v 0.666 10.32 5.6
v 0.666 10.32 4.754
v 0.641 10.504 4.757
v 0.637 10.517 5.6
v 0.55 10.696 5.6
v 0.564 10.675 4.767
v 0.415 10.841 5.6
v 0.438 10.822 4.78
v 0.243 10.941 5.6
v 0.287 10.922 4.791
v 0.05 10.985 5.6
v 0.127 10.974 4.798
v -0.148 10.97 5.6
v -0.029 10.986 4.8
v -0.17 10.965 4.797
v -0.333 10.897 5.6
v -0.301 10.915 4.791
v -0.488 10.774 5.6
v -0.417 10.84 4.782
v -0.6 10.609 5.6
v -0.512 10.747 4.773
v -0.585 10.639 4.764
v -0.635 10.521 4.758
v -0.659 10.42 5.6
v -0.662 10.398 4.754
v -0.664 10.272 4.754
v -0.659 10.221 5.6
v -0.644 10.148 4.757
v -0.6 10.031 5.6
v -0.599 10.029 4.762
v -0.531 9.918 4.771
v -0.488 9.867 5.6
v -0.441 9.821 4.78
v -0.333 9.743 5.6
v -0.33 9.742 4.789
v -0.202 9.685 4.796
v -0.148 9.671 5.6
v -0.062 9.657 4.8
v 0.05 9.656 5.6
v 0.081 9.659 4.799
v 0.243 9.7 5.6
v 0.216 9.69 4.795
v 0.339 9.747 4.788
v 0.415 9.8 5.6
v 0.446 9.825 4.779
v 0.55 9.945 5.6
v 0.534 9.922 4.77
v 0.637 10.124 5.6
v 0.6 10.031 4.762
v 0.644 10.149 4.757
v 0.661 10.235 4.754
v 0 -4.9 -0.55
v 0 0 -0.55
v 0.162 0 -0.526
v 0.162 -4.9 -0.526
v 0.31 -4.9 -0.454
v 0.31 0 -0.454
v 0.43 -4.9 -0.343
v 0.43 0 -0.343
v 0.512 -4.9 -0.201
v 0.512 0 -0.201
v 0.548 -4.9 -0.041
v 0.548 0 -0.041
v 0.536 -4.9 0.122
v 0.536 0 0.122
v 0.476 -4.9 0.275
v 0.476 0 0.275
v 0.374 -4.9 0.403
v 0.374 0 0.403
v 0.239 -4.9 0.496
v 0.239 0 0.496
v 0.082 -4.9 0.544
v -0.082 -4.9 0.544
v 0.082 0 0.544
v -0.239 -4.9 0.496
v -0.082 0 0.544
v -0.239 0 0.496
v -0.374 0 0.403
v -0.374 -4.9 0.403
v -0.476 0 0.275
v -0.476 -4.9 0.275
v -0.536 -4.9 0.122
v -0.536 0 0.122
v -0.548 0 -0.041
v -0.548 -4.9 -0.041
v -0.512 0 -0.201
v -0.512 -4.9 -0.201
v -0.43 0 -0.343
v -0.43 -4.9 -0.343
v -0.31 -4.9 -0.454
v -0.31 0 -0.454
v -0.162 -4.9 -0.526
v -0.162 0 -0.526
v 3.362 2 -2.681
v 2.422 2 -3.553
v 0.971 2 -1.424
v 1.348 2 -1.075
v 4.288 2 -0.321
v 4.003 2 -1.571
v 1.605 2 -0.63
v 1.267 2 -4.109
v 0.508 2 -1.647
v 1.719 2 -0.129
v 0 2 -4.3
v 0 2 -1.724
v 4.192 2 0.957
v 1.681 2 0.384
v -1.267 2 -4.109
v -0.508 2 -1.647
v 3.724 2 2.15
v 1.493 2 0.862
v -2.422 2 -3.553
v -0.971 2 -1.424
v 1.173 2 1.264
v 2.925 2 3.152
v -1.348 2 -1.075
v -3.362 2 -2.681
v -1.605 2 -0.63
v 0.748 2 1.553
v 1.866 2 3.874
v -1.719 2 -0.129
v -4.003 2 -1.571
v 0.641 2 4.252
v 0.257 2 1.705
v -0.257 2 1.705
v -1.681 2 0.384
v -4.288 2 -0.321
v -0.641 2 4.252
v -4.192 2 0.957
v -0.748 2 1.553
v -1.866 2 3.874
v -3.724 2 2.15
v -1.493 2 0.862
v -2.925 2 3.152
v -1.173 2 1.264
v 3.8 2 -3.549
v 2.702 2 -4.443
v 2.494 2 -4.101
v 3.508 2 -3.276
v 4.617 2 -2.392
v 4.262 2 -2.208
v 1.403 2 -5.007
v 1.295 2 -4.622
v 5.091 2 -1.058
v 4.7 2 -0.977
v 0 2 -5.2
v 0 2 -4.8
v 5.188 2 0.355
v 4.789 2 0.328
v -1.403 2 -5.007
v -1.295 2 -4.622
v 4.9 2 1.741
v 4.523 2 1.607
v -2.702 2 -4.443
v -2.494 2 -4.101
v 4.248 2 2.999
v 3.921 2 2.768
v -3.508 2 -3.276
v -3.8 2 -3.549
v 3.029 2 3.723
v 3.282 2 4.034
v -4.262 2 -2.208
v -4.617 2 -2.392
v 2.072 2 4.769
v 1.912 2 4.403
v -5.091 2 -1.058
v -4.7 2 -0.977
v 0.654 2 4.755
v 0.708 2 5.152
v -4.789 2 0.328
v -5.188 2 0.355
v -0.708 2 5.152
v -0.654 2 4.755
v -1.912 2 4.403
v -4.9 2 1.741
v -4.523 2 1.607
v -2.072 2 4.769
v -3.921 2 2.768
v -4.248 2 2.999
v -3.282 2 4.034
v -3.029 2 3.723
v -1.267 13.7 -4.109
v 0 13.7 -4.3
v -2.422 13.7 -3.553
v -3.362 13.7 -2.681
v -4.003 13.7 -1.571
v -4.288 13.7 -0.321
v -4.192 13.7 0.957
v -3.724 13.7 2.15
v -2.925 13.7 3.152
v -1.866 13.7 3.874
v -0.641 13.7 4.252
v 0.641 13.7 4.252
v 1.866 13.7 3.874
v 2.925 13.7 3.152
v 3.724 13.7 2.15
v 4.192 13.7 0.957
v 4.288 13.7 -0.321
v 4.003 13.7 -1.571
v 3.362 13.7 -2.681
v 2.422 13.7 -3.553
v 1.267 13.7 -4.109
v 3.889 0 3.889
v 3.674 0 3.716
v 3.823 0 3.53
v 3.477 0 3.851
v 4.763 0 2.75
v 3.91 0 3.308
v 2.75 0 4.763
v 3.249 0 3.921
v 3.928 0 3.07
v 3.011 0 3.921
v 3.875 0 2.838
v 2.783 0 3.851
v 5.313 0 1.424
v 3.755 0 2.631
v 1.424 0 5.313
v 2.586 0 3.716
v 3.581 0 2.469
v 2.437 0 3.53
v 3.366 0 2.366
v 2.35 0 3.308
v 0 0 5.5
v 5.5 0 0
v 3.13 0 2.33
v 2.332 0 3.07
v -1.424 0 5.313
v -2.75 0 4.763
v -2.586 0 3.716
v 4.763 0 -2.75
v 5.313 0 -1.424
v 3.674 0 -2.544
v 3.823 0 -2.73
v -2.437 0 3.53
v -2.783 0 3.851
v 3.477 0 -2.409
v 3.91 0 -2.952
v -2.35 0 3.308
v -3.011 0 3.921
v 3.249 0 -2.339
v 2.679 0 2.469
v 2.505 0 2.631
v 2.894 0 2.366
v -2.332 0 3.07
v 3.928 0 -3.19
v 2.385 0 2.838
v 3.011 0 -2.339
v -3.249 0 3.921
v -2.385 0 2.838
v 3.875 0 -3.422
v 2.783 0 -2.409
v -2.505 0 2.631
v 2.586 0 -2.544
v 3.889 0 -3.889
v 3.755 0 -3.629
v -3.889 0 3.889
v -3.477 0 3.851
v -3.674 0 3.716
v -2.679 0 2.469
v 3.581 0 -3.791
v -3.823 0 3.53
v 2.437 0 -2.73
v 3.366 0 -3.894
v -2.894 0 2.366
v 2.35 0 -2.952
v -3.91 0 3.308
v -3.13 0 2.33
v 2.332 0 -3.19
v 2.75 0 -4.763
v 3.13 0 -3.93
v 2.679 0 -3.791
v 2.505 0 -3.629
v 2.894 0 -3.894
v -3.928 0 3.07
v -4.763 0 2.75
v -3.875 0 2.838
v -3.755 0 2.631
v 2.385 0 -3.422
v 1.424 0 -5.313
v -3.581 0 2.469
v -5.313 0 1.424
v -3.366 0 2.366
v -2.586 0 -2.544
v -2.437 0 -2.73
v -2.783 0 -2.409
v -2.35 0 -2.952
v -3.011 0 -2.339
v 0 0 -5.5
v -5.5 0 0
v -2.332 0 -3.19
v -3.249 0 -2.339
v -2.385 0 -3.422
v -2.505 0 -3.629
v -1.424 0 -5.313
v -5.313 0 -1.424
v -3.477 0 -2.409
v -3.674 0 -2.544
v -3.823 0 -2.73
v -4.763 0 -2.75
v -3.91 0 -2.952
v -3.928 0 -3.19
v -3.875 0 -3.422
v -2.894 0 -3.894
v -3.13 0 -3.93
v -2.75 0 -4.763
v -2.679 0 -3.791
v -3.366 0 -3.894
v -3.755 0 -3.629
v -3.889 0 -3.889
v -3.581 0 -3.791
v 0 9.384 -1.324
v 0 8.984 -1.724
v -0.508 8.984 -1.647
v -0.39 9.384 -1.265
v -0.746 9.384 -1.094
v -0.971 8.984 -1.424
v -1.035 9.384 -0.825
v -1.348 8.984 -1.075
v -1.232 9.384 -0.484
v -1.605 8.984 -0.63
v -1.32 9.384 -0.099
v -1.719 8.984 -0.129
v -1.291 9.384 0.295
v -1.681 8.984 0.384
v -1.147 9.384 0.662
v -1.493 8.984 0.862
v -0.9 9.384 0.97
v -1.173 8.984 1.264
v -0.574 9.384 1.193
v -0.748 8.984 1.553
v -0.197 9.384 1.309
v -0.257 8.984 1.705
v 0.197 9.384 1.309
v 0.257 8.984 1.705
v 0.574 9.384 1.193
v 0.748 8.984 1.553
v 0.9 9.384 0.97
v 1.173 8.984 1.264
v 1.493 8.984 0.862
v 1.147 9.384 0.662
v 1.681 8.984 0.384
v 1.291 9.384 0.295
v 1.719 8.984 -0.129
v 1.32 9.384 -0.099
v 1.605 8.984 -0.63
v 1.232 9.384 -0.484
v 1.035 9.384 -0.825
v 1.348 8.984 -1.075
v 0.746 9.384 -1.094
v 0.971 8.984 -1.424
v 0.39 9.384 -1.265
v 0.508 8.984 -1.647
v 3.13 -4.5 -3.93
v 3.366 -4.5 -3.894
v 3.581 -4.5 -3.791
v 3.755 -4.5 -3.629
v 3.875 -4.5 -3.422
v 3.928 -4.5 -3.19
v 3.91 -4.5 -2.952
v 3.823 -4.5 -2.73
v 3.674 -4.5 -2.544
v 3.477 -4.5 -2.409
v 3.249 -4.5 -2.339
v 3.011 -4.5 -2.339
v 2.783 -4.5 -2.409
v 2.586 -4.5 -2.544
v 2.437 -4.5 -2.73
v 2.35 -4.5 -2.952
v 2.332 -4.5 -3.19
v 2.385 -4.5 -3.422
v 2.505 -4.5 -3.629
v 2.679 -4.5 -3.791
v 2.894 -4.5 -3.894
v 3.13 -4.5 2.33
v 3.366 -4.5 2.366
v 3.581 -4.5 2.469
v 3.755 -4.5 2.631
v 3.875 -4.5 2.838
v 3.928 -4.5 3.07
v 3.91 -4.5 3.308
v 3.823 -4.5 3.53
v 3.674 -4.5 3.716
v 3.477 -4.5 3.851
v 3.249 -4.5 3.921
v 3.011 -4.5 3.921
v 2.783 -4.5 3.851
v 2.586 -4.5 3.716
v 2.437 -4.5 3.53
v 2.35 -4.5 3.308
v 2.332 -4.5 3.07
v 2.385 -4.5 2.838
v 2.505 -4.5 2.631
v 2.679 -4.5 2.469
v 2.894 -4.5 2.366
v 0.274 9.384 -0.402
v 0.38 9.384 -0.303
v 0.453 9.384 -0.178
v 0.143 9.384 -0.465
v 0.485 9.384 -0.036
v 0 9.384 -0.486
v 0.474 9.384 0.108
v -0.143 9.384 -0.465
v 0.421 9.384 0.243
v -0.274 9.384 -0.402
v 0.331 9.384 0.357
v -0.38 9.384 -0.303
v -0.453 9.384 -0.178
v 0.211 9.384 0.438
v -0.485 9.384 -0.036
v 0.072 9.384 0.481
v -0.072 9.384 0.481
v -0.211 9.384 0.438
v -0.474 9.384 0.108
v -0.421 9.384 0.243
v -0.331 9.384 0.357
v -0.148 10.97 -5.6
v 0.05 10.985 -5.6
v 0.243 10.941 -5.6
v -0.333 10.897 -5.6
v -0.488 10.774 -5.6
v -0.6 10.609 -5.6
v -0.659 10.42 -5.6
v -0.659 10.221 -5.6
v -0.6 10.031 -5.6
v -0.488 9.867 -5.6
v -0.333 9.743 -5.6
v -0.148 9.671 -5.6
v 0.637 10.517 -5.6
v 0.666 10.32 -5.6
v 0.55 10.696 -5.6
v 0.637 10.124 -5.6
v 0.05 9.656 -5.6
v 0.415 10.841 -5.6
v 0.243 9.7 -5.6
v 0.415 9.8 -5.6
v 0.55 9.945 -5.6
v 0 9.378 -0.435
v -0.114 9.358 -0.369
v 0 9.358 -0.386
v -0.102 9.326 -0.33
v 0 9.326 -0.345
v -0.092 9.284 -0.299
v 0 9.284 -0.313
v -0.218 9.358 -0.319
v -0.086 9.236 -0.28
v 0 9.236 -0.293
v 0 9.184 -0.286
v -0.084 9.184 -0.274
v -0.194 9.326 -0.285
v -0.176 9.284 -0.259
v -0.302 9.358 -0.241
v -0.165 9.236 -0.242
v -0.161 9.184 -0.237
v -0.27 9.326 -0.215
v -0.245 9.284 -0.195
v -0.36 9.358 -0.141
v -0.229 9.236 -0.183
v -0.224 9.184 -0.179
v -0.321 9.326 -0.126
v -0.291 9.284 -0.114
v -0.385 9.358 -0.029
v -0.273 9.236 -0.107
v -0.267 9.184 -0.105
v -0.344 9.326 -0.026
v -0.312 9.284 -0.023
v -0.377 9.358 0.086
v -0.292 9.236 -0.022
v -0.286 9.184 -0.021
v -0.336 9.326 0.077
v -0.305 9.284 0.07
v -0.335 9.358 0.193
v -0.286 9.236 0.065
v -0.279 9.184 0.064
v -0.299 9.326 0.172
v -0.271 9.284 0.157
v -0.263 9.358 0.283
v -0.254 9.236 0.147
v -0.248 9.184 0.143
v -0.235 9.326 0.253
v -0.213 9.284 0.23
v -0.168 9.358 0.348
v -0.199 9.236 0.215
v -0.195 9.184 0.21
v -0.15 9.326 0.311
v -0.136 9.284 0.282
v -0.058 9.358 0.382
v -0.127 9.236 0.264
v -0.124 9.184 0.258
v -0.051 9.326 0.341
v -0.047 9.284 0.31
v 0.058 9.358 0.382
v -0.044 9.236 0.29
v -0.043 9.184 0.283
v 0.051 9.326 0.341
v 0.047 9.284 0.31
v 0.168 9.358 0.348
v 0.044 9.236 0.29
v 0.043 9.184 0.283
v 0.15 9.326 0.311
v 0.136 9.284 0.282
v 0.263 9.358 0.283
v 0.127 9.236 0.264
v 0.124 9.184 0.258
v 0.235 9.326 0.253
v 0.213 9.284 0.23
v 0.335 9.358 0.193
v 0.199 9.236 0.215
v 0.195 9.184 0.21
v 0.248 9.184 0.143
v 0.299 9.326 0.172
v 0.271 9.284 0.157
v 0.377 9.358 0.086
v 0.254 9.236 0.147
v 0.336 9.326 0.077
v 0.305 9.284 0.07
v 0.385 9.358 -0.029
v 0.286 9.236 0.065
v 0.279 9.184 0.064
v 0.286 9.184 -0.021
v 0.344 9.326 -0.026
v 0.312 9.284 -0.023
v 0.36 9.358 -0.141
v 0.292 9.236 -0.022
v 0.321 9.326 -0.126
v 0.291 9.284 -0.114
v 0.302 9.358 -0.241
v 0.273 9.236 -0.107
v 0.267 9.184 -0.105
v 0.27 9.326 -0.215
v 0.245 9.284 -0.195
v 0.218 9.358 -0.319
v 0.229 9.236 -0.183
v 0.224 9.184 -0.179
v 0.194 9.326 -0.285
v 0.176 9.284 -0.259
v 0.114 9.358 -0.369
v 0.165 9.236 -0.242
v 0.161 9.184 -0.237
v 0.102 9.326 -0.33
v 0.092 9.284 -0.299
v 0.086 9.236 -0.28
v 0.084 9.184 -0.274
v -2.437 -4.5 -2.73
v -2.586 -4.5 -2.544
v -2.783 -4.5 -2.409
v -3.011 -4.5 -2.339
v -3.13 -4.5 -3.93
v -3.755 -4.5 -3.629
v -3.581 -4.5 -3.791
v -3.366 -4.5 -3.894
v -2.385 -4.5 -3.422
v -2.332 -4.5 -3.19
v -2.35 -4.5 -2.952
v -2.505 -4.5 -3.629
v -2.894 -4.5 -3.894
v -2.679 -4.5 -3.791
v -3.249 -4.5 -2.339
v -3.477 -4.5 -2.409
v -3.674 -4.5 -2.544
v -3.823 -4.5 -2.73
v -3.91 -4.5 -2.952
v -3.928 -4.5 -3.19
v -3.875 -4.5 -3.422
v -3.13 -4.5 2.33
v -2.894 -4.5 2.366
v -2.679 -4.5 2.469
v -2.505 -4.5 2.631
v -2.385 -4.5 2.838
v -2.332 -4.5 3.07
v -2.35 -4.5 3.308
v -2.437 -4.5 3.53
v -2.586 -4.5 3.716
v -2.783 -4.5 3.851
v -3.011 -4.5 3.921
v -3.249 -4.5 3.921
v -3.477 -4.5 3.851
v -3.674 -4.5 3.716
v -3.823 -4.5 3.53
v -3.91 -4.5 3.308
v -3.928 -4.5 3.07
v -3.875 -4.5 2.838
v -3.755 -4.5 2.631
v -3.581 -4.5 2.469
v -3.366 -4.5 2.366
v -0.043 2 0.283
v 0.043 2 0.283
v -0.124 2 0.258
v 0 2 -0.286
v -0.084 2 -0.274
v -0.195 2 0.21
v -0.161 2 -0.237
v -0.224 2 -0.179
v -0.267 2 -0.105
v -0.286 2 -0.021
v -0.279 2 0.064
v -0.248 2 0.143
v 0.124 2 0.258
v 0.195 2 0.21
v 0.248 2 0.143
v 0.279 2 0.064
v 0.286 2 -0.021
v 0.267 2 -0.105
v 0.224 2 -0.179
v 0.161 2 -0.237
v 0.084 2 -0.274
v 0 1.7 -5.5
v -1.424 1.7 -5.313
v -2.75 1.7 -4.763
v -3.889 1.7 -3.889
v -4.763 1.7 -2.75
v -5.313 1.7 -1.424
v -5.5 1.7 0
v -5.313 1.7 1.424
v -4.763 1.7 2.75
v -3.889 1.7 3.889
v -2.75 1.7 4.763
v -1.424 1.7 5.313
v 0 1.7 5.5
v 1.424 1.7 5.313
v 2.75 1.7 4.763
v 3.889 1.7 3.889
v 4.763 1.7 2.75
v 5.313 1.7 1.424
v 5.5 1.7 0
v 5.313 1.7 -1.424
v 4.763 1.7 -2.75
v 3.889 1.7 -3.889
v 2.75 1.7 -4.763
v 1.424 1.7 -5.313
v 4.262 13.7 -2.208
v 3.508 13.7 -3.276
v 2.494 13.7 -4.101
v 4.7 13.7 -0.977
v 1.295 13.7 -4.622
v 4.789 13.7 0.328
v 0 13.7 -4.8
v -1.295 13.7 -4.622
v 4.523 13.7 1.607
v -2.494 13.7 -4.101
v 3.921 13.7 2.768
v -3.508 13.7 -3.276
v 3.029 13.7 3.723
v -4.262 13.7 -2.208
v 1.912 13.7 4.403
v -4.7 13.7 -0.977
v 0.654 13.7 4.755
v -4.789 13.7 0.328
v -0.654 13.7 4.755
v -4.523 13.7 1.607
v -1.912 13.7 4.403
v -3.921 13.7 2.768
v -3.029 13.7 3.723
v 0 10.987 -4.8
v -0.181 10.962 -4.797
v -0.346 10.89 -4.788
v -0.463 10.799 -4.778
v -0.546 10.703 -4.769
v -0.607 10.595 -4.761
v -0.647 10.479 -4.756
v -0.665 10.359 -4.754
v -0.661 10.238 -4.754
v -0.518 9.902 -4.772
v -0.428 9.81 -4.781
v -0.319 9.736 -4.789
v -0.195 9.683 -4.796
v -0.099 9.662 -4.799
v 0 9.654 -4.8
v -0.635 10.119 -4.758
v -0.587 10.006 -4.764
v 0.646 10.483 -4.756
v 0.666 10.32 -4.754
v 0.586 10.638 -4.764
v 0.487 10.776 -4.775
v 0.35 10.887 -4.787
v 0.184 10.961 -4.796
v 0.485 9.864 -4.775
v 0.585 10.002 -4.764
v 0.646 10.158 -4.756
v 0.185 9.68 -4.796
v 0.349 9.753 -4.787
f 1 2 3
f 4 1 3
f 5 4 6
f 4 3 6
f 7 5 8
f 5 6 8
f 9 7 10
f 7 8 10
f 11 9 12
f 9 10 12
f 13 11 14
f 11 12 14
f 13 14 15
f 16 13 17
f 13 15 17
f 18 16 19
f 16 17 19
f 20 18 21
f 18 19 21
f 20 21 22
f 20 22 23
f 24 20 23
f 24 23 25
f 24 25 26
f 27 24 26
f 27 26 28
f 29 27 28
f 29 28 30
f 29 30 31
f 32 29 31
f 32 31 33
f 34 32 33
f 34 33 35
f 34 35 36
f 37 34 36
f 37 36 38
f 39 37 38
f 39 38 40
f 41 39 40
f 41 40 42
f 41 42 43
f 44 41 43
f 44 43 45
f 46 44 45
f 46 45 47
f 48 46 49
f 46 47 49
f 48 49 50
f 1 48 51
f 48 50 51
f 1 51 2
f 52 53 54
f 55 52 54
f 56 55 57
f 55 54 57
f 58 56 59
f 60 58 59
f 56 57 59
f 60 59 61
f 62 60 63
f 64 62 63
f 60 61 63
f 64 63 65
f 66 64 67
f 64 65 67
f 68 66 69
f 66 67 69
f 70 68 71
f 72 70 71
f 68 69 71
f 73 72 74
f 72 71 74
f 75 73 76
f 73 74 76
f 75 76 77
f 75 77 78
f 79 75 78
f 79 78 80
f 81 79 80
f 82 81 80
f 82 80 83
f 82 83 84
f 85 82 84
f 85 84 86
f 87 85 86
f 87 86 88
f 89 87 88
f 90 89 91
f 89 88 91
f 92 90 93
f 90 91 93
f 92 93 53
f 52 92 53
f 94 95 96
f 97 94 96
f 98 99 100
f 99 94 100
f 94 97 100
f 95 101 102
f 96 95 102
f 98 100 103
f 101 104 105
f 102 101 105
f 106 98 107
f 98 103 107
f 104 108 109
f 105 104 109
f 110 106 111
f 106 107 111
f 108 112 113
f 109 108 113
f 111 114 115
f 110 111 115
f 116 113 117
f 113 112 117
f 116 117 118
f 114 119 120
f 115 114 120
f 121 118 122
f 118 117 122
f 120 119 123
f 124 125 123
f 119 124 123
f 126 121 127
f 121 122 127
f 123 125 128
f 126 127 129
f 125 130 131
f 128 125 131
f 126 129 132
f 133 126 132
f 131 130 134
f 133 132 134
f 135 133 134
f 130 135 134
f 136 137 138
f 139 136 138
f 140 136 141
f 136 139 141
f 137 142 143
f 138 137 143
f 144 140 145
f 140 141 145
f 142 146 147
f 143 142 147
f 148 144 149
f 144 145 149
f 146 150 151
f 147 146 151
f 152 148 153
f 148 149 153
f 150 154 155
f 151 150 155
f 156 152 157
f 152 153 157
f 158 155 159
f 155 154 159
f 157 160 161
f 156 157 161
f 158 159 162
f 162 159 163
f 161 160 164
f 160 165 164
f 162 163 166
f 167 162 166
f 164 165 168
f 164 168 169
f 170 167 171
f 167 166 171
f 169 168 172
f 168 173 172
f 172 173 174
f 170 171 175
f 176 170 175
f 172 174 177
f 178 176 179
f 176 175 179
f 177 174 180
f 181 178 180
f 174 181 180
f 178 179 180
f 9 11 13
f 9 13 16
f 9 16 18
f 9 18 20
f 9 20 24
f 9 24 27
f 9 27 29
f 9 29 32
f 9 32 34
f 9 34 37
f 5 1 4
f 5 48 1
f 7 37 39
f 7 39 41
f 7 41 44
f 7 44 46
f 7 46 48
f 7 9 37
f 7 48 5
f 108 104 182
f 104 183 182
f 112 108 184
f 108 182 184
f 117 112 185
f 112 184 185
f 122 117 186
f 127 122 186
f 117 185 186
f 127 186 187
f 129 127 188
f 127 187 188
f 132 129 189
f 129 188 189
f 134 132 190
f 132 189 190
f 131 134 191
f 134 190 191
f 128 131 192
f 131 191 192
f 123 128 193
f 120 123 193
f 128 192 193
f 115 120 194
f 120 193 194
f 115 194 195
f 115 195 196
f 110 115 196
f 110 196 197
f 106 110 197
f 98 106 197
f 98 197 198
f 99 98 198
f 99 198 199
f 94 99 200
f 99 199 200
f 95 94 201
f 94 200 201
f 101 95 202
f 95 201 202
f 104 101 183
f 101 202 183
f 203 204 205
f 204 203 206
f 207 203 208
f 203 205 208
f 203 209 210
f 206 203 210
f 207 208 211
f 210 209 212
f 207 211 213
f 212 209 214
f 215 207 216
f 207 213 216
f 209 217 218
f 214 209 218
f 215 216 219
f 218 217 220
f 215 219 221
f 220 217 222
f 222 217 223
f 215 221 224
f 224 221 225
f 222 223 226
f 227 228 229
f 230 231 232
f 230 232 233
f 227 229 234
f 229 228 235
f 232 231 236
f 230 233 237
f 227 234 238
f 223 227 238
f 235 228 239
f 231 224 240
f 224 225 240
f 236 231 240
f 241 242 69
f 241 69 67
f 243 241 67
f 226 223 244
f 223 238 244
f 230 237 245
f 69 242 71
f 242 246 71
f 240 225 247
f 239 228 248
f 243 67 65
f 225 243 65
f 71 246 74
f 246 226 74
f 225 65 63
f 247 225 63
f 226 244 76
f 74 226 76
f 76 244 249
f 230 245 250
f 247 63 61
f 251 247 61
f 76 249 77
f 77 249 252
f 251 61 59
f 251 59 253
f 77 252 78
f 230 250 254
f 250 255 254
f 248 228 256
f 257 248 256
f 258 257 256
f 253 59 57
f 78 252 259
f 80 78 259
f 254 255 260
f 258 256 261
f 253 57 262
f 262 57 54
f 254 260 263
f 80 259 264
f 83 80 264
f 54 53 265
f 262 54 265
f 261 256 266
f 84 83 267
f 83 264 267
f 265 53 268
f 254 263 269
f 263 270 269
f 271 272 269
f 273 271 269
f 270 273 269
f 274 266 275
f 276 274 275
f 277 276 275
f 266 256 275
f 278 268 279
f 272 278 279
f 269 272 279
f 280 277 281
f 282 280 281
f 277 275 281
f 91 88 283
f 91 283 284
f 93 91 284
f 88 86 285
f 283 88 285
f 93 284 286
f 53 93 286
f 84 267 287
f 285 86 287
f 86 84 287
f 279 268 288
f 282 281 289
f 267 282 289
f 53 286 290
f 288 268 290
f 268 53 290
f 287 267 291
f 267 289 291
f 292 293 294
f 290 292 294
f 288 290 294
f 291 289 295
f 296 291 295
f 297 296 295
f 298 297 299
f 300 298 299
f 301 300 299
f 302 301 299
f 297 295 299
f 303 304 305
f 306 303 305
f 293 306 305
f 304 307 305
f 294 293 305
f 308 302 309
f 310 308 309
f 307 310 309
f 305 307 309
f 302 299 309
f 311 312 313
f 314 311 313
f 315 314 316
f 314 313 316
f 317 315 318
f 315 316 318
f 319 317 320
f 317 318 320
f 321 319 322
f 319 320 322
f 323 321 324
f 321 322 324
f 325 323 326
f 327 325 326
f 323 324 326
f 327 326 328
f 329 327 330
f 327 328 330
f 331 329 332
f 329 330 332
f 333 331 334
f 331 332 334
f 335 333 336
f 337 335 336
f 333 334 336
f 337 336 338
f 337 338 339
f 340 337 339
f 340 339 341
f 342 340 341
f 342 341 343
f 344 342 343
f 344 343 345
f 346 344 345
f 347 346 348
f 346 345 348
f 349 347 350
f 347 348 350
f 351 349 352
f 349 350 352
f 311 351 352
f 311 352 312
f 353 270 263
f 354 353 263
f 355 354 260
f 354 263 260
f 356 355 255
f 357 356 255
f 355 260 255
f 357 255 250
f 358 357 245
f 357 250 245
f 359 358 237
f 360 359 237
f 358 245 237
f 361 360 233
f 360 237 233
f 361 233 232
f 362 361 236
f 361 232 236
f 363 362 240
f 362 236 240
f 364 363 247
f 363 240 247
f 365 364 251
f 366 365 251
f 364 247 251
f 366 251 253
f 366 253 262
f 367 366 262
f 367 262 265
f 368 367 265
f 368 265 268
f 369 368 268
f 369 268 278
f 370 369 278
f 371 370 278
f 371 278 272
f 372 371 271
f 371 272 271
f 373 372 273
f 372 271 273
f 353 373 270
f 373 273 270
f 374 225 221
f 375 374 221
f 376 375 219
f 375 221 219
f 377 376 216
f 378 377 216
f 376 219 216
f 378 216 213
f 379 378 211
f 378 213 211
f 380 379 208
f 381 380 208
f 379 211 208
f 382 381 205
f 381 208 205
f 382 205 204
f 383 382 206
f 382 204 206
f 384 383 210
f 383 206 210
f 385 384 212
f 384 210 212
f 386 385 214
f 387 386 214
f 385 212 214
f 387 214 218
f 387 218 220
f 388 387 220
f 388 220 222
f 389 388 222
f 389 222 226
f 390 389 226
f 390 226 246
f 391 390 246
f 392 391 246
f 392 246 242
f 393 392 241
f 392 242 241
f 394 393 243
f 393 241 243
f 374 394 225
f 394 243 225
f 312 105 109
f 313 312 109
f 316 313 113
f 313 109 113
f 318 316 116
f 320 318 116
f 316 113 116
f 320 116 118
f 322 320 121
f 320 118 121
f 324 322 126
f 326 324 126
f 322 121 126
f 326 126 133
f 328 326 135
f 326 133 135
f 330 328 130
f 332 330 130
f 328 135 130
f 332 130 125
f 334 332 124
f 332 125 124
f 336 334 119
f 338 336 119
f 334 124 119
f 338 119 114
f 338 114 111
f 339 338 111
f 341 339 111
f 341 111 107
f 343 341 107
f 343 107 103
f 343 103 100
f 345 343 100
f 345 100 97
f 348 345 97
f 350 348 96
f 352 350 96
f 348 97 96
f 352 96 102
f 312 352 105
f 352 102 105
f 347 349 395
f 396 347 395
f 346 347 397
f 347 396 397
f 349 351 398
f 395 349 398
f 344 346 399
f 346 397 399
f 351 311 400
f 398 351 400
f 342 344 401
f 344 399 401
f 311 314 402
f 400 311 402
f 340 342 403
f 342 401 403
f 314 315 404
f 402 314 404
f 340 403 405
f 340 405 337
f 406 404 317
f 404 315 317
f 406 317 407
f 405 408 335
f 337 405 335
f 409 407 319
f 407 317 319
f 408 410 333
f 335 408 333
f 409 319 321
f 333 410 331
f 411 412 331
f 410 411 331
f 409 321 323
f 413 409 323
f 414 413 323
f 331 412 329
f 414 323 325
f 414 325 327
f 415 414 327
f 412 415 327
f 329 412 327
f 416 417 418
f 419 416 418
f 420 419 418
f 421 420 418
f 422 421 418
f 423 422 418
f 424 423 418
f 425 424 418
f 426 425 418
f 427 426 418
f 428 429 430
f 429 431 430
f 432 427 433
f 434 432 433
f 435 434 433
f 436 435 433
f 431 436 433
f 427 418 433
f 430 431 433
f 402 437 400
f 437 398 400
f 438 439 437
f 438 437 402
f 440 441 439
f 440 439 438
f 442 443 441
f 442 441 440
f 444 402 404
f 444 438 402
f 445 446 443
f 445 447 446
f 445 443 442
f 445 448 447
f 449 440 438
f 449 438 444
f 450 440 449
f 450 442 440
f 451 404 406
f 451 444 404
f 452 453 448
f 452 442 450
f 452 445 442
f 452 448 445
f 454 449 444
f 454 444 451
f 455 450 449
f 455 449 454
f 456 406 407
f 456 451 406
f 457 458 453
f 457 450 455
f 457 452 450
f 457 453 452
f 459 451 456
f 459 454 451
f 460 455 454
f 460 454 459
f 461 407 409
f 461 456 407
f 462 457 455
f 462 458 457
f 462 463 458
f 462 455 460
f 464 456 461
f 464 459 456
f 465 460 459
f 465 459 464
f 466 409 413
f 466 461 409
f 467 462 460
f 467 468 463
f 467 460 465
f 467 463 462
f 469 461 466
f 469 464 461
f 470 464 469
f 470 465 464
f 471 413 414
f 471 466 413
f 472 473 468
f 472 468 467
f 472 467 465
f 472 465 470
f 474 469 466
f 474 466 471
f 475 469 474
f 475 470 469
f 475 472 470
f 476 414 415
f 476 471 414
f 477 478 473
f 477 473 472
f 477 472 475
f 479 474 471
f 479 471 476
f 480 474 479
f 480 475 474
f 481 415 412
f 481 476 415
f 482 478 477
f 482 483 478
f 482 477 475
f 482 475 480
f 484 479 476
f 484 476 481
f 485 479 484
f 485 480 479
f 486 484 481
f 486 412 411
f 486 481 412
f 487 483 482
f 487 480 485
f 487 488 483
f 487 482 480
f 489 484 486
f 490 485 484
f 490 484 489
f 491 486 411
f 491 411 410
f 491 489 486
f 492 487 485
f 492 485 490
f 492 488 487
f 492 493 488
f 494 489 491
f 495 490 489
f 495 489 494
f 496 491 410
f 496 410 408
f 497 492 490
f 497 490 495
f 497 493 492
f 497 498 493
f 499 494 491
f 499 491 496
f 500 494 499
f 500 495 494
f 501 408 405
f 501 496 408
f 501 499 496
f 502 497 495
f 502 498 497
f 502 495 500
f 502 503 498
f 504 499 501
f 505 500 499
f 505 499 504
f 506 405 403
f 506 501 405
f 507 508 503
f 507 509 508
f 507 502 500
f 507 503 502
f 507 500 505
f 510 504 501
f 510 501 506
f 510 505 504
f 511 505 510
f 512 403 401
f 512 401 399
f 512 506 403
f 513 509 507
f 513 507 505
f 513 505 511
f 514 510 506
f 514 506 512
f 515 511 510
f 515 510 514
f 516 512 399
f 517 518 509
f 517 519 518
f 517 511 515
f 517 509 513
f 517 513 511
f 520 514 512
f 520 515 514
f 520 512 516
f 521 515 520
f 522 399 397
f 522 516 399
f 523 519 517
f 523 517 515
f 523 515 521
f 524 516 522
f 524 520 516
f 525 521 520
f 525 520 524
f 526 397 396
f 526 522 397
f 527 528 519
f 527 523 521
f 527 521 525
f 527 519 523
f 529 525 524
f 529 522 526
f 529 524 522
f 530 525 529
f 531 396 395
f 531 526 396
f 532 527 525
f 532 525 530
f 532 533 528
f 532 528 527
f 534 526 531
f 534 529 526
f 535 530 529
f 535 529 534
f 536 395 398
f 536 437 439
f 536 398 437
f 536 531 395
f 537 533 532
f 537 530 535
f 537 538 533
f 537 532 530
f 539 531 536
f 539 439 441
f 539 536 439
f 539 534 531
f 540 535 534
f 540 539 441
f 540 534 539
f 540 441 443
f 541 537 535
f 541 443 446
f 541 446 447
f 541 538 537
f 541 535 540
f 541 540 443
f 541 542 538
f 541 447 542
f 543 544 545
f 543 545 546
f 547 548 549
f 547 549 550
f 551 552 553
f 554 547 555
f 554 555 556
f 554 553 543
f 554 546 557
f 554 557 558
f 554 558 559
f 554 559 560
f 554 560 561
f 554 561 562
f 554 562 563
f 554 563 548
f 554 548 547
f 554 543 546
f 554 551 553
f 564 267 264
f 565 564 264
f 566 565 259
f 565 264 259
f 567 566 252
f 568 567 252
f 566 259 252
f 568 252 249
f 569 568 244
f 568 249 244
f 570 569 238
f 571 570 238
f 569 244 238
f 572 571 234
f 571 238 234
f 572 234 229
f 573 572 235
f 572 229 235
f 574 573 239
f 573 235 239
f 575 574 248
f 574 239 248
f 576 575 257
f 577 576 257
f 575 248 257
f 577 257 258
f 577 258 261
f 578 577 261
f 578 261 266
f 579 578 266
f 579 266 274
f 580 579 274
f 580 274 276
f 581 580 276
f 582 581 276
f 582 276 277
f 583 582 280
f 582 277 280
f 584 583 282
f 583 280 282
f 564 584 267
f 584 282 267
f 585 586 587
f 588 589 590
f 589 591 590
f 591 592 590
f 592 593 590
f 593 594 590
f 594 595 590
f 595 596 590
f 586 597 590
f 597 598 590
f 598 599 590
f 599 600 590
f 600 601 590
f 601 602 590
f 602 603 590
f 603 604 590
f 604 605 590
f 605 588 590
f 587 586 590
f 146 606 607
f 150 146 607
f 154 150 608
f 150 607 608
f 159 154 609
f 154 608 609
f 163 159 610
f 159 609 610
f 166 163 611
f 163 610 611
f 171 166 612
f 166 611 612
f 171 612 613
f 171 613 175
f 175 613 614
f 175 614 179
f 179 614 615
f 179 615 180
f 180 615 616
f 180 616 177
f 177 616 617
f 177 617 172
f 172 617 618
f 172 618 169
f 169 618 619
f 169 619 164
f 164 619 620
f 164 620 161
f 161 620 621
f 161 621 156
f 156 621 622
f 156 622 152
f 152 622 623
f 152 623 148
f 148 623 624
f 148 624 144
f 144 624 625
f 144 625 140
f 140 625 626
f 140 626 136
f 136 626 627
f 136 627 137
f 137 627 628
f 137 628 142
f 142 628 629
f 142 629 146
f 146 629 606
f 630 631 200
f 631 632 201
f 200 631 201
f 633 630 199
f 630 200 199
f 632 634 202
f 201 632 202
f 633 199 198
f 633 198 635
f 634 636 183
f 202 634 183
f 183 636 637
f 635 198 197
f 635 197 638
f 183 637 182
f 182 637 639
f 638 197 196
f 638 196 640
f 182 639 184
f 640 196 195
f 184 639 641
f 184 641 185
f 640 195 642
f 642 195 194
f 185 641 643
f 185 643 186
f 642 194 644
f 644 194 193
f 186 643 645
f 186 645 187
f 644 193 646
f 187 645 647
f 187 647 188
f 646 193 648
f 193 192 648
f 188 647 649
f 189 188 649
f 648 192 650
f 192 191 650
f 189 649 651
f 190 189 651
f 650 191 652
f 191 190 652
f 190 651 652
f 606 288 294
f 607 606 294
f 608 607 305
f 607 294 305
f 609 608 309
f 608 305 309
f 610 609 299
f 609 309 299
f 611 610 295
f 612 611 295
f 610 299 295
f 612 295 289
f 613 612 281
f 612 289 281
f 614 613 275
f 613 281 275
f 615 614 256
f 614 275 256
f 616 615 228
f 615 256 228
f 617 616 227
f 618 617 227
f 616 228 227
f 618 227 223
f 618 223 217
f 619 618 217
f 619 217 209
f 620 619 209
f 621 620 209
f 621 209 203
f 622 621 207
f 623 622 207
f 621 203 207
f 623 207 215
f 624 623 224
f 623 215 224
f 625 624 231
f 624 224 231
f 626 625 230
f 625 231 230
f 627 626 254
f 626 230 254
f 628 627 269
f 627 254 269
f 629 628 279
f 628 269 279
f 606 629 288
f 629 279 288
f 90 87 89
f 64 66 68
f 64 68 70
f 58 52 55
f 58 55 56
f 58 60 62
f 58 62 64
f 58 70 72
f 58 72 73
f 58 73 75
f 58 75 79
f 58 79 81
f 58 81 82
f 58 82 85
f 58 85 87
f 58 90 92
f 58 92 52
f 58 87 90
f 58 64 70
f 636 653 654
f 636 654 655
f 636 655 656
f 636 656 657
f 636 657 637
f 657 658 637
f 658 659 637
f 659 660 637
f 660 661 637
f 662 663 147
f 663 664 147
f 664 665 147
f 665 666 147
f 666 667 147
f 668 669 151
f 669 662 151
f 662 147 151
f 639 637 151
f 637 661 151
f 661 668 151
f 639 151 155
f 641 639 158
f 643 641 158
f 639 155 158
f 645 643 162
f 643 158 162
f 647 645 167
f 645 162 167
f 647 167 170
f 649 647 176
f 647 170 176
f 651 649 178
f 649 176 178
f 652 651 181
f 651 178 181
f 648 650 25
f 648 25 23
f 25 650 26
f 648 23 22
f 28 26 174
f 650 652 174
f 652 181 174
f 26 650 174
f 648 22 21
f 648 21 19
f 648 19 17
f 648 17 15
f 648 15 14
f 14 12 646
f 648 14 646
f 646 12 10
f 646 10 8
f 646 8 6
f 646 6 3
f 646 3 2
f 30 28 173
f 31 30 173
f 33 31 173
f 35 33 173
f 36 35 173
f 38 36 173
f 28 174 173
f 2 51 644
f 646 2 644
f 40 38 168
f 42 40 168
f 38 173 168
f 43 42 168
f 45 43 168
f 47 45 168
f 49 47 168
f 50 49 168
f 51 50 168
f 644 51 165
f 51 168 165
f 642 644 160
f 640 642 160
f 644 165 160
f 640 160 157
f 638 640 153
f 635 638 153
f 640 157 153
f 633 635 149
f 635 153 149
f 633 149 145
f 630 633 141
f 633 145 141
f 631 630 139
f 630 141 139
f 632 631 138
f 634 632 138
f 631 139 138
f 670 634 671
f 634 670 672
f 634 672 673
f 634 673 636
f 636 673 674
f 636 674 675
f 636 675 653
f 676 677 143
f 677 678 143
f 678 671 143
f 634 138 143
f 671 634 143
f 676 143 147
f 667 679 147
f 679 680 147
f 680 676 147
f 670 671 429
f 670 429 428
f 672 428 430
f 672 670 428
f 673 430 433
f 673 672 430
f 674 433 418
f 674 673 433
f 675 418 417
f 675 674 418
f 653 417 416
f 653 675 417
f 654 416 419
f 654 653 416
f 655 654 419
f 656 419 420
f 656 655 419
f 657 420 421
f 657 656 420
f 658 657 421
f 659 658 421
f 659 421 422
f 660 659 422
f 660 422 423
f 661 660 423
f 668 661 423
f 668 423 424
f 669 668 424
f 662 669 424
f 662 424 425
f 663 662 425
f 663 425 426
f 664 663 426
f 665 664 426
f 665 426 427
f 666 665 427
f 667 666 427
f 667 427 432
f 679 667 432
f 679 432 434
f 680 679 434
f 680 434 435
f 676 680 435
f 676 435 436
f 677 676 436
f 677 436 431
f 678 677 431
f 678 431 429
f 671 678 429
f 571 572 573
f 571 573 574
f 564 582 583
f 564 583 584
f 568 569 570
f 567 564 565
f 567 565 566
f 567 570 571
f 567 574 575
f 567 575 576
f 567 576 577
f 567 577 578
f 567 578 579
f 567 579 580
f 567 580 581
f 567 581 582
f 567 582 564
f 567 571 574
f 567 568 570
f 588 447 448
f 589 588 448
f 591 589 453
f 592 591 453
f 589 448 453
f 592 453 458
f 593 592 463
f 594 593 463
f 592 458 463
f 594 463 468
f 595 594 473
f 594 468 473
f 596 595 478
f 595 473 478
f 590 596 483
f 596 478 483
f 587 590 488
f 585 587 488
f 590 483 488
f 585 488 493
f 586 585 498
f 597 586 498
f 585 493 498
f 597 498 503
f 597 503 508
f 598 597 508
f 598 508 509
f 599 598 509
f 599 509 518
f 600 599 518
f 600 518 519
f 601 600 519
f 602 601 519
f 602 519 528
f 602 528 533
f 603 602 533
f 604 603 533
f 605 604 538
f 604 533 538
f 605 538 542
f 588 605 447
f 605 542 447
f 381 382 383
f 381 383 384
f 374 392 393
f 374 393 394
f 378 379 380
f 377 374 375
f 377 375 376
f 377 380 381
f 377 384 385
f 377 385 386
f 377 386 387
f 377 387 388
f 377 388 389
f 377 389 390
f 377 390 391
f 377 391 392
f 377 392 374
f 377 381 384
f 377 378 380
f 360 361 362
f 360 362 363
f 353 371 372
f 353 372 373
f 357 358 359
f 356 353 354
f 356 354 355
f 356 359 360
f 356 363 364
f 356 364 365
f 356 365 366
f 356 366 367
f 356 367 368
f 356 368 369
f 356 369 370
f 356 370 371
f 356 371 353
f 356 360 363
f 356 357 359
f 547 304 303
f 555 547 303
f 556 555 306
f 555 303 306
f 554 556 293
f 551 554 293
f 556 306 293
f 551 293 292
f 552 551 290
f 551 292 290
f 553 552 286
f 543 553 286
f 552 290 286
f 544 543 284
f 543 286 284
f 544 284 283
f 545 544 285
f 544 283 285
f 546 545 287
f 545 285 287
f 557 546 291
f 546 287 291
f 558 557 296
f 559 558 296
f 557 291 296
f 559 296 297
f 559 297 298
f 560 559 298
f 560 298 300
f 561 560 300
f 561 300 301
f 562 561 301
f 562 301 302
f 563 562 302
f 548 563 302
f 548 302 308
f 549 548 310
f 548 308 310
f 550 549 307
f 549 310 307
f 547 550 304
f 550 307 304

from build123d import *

# Parameters (mm, degrees)
BOSS_EXTRUDE1_START = -0.046461
SKETCH4_R           = 0.666231497
BOSS_EXTRUDE1_DEPTH = 0.846461
CHAMFER1_SIZE       = 0.3
FILLET1_R           = 0.2
CHAMFER2_SIZE       = 0.4
SKETCH5_R           = 0.55
BOSS_EXTRUDE2_DEPTH = 4.9
SKETCH5_3_R         = 0.8
BOSS_EXTRUDE3_DEPTH = 4.5


with BuildPart() as part:
    # Sketch1 → Revolve1 (revolve)
    with BuildSketch(Plane(origin=(0, 0, 0), x_dir=(0, 0, -1), z_dir=(1, 0, 0))):
        Polygon((0, 0), (0, 2), (0.286334312, 2), (0.286334312, 9.384488656), (1.723916807, 9.384488656), (1.723916807, 2), (4.3, 2), (4.3, 13.7), (4.8, 13.7), (4.8, 2), (5.5, 2), (5.5, 0), align=None)
    revolve(axis=Axis((0, 0, 0), (0, 1, 0)))

    # Sketch4 → Boss-Extrude1 (add)
    with BuildSketch(Plane.XY.offset(4.8).offset(BOSS_EXTRUDE1_START)):
        with Locations((0, 10.320424239)):
            Circle(SKETCH4_R)
    boss_extrude1 = extrude(amount=BOSS_EXTRUDE1_DEPTH)

    # Mirror1: Boss-Extrude1 across plane
    add(boss_extrude1.mirror(Plane(origin=(0, 0, 0), x_dir=(1, 0, 0), z_dir=(0, 0, -1))))

    # Chamfer1
    chamfer1_edges = [part.edges().sort_by_distance(p)[0] for p in [
        (0, 2, 5.5),
    ]]
    chamfer(chamfer1_edges, length=CHAMFER1_SIZE)

    # Fillet1
    fillet1_edges = [part.edges().sort_by_distance(p)[0] for p in [
        (0, 9.384488656, 0.286334312),
    ]]
    fillet(fillet1_edges, radius=FILLET1_R)

    # Chamfer2
    chamfer2_edges = [part.edges().sort_by_distance(p)[0] for p in [
        (0, 9.384488656, 1.723916807),
    ]]
    chamfer(chamfer2_edges, length=CHAMFER2_SIZE)

    # Sketch5 → Boss-Extrude2 (add)
    with BuildSketch(Plane.XZ):
        with Locations(Location((0, 0, 0), (0, 0, 270))):
            Circle(SKETCH5_R)
    extrude(amount=BOSS_EXTRUDE2_DEPTH)

    # Sketch5<3> → Boss-Extrude3 (add)
    with BuildSketch(Plane.XZ):
        with Locations(Location((-3.13, 3.13, 0), (0, 0, 270))):
            Circle(SKETCH5_3_R)
        with Locations(Location((3.13, 3.13, 0), (0, 0, 270))):
            Circle(SKETCH5_3_R)
        with Locations(Location((-3.13, -3.13, 0), (0, 0, 270))):
            Circle(SKETCH5_3_R)
        with Locations(Location((3.13, -3.13, 0), (0, 0, 270))):
            Circle(SKETCH5_3_R)
    extrude(amount=BOSS_EXTRUDE3_DEPTH)


solid = part.part
